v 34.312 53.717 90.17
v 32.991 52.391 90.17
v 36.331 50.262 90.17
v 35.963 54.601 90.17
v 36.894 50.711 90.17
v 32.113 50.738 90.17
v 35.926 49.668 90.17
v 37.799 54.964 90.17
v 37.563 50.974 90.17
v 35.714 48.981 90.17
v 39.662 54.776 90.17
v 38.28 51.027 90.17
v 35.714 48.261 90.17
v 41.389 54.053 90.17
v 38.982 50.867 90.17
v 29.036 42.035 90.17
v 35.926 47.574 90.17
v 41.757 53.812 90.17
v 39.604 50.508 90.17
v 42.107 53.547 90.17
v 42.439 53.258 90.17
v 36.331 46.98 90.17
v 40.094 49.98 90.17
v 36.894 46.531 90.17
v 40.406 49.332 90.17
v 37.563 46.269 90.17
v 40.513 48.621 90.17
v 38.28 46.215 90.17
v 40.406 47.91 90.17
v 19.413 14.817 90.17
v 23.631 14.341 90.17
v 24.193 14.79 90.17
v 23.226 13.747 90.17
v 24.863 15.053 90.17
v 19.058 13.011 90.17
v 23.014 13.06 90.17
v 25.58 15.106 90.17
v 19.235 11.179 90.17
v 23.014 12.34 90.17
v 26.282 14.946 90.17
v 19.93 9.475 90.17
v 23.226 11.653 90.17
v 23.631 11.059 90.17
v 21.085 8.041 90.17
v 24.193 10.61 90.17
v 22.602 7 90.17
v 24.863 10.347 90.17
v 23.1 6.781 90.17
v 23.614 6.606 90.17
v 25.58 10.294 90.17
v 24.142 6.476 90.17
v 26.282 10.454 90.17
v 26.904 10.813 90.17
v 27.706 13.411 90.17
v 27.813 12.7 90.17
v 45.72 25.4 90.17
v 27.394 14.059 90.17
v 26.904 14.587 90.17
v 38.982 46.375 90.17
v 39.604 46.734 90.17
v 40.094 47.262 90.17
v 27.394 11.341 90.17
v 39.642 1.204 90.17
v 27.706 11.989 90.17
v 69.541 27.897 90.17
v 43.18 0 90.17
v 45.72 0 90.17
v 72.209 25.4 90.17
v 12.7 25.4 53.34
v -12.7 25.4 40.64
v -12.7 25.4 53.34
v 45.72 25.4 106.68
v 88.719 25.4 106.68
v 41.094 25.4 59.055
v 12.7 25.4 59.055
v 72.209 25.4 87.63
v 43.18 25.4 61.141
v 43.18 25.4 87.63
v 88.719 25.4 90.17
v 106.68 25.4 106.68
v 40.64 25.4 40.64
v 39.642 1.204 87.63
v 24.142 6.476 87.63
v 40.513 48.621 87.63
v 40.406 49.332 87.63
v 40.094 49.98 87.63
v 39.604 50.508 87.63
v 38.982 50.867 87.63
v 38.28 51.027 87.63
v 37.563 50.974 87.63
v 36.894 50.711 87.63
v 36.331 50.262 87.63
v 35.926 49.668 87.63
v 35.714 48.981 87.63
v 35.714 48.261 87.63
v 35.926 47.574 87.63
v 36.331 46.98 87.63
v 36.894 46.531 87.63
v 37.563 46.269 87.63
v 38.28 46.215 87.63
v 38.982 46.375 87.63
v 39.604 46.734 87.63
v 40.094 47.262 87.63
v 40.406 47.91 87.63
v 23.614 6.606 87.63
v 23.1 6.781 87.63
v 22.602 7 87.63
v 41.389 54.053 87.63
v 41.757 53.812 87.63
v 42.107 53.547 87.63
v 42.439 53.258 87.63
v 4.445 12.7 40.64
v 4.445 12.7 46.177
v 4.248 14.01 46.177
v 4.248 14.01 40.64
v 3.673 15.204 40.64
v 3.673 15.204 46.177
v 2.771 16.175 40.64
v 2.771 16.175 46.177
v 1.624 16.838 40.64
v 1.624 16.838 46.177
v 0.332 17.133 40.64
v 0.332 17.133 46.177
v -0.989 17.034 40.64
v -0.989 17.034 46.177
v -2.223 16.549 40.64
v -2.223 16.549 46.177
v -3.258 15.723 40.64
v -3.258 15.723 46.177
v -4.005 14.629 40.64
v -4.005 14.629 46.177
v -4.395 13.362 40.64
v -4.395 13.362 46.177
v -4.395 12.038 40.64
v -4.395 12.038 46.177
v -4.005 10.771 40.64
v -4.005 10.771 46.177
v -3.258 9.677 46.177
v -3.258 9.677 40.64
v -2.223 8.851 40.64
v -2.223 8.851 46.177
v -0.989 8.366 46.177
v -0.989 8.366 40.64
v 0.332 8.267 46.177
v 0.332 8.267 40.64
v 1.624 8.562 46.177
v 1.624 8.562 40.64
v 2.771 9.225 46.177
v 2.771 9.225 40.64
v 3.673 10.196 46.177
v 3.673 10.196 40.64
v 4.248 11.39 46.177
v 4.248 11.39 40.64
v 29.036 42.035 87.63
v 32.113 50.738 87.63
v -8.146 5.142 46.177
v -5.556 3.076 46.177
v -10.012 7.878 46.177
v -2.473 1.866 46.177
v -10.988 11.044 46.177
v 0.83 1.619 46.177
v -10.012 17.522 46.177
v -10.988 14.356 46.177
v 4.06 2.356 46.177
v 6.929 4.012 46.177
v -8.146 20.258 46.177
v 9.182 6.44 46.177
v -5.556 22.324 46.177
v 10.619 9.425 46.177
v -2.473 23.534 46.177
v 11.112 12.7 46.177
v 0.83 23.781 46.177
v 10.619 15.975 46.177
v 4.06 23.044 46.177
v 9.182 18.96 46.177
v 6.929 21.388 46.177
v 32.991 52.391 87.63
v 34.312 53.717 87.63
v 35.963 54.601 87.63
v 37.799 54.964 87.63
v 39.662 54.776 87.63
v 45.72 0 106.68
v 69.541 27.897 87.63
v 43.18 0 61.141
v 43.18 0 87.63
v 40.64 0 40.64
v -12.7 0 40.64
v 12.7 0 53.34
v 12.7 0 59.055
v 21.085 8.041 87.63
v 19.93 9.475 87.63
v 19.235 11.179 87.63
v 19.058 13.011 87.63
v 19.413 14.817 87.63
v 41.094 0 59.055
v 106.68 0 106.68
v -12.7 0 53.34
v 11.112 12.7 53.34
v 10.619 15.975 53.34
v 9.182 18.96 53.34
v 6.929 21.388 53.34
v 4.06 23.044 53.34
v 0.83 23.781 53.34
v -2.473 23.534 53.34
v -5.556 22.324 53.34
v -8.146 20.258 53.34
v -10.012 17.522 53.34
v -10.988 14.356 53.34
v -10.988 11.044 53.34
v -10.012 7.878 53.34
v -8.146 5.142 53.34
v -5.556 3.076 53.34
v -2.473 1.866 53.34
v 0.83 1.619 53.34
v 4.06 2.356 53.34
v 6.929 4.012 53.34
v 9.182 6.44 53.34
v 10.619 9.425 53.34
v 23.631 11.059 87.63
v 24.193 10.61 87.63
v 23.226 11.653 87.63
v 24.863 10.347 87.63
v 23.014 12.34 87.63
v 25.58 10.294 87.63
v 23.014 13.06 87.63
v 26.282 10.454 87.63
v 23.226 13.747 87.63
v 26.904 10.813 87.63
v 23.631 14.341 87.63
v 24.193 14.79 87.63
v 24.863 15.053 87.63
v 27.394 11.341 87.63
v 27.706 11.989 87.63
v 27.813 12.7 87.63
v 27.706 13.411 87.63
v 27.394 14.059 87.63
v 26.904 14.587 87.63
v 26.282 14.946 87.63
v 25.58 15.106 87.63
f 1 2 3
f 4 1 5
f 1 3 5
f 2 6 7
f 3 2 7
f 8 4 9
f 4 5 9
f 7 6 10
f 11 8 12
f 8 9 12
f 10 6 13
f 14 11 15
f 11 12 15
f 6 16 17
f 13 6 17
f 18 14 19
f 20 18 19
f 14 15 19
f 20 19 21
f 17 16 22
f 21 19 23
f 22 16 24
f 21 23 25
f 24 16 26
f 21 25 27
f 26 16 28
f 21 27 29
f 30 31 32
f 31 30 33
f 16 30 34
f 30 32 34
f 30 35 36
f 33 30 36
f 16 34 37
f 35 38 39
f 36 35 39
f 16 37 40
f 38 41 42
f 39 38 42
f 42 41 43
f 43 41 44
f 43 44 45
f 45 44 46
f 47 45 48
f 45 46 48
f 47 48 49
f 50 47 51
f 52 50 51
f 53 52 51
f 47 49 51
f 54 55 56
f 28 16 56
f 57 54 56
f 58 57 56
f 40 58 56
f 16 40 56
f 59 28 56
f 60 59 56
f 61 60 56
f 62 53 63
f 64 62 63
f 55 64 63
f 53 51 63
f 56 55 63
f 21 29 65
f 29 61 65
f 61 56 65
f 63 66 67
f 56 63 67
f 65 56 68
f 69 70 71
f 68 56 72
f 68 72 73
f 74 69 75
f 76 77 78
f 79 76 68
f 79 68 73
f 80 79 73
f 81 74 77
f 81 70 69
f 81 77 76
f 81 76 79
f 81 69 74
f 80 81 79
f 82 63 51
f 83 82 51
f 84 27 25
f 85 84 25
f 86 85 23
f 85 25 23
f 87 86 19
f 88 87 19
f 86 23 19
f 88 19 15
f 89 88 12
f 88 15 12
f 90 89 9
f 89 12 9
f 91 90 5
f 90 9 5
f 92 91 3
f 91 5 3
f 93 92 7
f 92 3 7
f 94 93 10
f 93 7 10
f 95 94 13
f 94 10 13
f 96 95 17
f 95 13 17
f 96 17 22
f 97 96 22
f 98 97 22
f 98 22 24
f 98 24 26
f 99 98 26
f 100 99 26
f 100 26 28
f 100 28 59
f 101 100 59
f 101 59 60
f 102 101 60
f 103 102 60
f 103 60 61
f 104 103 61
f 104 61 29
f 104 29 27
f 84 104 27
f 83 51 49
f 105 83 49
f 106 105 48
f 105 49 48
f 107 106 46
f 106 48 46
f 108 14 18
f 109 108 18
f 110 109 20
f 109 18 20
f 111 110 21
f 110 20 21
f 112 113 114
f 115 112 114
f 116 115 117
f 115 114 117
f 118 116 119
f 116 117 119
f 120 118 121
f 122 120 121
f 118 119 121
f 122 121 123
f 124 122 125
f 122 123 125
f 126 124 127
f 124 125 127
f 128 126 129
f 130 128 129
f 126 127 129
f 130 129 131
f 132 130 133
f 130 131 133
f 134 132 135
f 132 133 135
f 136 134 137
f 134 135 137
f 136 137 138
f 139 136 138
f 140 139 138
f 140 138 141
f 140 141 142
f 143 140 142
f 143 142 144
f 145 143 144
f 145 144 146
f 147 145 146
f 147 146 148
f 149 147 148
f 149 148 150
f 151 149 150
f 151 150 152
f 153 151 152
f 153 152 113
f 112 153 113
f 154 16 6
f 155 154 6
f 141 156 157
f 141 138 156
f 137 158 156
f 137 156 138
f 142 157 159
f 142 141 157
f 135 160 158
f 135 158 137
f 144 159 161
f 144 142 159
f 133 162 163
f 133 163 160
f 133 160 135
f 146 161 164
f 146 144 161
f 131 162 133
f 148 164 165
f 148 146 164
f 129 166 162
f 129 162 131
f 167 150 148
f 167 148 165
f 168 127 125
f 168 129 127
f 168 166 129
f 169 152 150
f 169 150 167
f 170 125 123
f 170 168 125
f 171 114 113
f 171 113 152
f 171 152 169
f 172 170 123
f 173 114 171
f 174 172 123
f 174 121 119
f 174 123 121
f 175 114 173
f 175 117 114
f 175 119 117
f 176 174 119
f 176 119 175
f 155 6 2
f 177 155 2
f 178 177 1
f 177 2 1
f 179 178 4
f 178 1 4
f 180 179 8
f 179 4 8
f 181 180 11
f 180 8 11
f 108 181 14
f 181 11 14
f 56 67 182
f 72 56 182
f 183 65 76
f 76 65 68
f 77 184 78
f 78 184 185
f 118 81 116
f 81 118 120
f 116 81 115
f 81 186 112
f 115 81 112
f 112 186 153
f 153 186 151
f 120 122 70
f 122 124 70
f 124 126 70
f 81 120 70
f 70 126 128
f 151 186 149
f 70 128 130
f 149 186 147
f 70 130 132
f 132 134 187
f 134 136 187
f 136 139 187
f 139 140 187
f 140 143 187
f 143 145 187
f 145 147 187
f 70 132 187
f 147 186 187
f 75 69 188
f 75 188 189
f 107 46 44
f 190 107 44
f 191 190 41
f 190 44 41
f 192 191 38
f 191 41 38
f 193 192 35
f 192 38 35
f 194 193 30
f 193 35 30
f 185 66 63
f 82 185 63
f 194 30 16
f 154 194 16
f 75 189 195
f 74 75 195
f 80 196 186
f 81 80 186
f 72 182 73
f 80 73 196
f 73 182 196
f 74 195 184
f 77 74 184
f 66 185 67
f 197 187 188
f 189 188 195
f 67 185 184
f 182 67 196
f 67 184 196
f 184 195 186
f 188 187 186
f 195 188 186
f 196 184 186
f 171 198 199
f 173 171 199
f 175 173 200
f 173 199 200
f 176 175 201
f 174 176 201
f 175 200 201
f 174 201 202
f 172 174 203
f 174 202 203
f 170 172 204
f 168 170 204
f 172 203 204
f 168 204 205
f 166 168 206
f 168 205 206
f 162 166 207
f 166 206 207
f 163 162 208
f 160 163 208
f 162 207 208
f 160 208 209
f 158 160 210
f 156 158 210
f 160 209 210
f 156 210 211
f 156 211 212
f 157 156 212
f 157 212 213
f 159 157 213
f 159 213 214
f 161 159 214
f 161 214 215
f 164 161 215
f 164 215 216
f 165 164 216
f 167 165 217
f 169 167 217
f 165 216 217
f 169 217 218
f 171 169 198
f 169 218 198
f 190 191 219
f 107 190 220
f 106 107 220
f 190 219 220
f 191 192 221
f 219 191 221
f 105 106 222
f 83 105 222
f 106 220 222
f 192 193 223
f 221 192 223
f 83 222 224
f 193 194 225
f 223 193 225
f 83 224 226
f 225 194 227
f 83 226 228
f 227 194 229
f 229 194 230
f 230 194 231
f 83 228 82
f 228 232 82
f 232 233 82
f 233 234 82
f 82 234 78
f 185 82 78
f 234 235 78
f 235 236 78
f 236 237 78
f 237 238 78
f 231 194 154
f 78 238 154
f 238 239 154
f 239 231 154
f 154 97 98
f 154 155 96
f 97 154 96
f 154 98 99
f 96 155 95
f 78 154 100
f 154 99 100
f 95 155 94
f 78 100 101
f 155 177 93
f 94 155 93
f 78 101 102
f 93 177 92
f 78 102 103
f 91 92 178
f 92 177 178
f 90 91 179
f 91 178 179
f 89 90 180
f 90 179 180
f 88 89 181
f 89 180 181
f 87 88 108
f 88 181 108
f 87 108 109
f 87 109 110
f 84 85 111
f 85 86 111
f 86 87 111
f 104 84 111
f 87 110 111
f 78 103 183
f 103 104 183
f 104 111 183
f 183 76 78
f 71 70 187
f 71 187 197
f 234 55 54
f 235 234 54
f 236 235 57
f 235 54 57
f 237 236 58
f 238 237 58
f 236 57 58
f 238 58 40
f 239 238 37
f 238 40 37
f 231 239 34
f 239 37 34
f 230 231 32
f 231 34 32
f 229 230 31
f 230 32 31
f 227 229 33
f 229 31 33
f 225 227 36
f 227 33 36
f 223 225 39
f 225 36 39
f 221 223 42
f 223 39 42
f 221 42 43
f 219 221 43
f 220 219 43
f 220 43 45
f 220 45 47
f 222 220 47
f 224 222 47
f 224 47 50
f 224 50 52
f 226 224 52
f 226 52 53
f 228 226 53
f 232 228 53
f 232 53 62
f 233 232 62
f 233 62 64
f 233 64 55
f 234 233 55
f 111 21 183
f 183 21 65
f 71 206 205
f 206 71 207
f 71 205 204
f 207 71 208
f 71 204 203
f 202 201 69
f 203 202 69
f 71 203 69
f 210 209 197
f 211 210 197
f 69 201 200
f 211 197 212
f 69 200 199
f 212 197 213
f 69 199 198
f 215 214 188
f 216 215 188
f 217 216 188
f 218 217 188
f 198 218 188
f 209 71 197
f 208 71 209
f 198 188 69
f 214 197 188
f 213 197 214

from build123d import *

# Parameters (mm, degrees)
BOSS_EXTRUDE1_DEPTH = 25.4
SKETCH2_R           = 11.1125
CUT_EXTRUDE1_DEPTH  = 7.1628
CUT_EXTRUDE2_REACH  = 123.946
SKETCH2_3_R         = 4.445
BOSS_EXTRUDE2_DEPTH = 68.58
CUT_EXTRUDE3_REACH  = 138.151
SKETCH4_R           = 2.413
CUT_EXTRUDE4_REACH  = 138.151
CUT_EXTRUDE5_START  = 16.51
CUT_EXTRUDE5_DEPTH  = 16.51
CUT_EXTRUDE7_REACH  = 131.829
CUT_EXTRUDE8_REACH  = 155.739
CUT_EXTRUDE10_REACH = 131.829
BOSS_EXTRUDE3_DEPTH = 2.54


with BuildPart() as part:
    # Sketch1 → Boss-Extrude1 (new body)
    with BuildSketch(Plane(origin=(0, 0, 0), x_dir=(1, 0, 0), z_dir=(0, 1, 0))):
        Polygon((35.379487758, -53.34), (22.679487758, -40.64), (-12.7, -40.64), (-12.7, -53.34), (12.7, -53.34), align=None)
        Polygon((90.17, -90.17), (40.64, -40.64), (22.679487758, -40.64), (35.379487758, -53.34), (41.094487758, -59.055), (43.18, -61.140512242), (72.209487758, -90.17), align=None)
        Polygon((41.094487758, -59.055), (35.379487758, -53.34), (12.7, -53.34), (12.7, -59.055), align=None)
        Polygon((45.72, -90.17), (72.209487758, -90.17), (43.18, -61.140512242), (43.18, -87.63), (16.51, -87.63), (16.51, -90.17), align=None)
        Polygon((88.719487758, -106.68), (72.209487758, -90.17), (45.72, -90.17), (45.72, -106.68), align=None)
        Polygon((106.68, -106.68), (90.17, -90.17), (72.209487758, -90.17), (88.719487758, -106.68), align=None)
    extrude(amount=BOSS_EXTRUDE1_DEPTH)

    # Sketch2 → Cut-Extrude1 (cut)
    with BuildSketch(Plane.XY.offset(53.34)):
        with Locations((0, 12.7)):
            Circle(SKETCH2_R)
    extrude(amount=-CUT_EXTRUDE1_DEPTH, mode=Mode.SUBTRACT)

    # Sketch2<3> → Cut-Extrude2 (cut, up to next)
    with BuildSketch(Plane.XY.offset(53.34), mode=Mode.PRIVATE) as cut_extrude2_sk1:
        with Locations((0, 12.7)):
            Circle(SKETCH2_3_R)
    cut_extrude2_tool1 = extrude(cut_extrude2_sk1.sketch, amount=-CUT_EXTRUDE2_REACH, mode=Mode.PRIVATE) & part.part
    add(cut_extrude2_tool1.solids().sort_by_distance((0, 12.7, 53.34))[0], mode=Mode.SUBTRACT)

    # Sketch1<3> → Boss-Extrude2 (add)
    with BuildSketch(Plane(origin=(0, 0, 0), x_dir=(1, 0, 0), z_dir=(0, 1, 0))):
        Polygon((88.719487758, -106.68), (72.209487758, -90.17), (45.72, -90.17), (45.72, -106.68), align=None)
        Polygon((45.72, -90.17), (72.209487758, -90.17), (43.18, -61.140512242), (43.18, -87.63), (16.51, -87.63), (16.51, -90.17), align=None)
    extrude(amount=BOSS_EXTRUDE2_DEPTH)

    # Sketch4 → Cut-Extrude3 (cut, up to next)
    with BuildSketch(Plane.XY.offset(90.17), mode=Mode.PRIVATE) as cut_extrude3_sk1:
        with Locations((38.1, 48.621024484)):
            Circle(SKETCH4_R)
    cut_extrude3_tool1 = extrude(cut_extrude3_sk1.sketch, amount=-CUT_EXTRUDE3_REACH, mode=Mode.PRIVATE) & part.part
    # Sketch4 → Cut-Extrude3 (cut, up to next)
    with BuildSketch(Plane.XY.offset(90.17), mode=Mode.PRIVATE) as cut_extrude3_sk2:
        with Locations((25.4, 12.7)):
            Circle(SKETCH4_R)
    cut_extrude3_tool2 = extrude(cut_extrude3_sk2.sketch, amount=-CUT_EXTRUDE3_REACH, mode=Mode.PRIVATE) & part.part
    add(cut_extrude3_tool1.solids().sort_by_distance((38.1, 48.621024, 90.17))[0], mode=Mode.SUBTRACT)
    add(cut_extrude3_tool2.solids().sort_by_distance((25.4, 12.7, 90.17))[0], mode=Mode.SUBTRACT)

    # Sketch4<4> → Cut-Extrude4 (cut, up to next)
    with BuildSketch(Plane.XY.offset(90.17), mode=Mode.PRIVATE) as cut_extrude4_sk1:
        with BuildLine():
            ThreePointArc((16.51, 50.529162362), (23.165769401, 46.860982905), (29.036193408, 42.034708067))
            Line((29.036193408, 42.034708067), (32.113162586, 50.737691151))
            ThreePointArc((32.113162586, 50.737691151), (35.962630111, 54.600501883), (41.388506693, 54.053171733))
            Line((41.388506693, 54.053171733), (88.719487758, 25.4))
            Line((88.719487758, 25.4), (88.719487758, 68.58))
            Line((88.719487758, 68.58), (16.51, 68.58))
            Line((16.51, 68.58), (16.51, 50.529162362))
        make_face()
    cut_extrude4_tool1 = extrude(cut_extrude4_sk1.sketch, amount=-CUT_EXTRUDE4_REACH, mode=Mode.PRIVATE) & part.part
    # Sketch4<4> → Cut-Extrude4 (cut, up to next)
    with BuildSketch(Plane.XY.offset(90.17), mode=Mode.PRIVATE) as cut_extrude4_sk2:
        with BuildLine():
            ThreePointArc((24.141722061, 6.475914796), (23.355096734, 6.688272242), (22.602138971, 6.999607587))
            ThreePointArc((22.602138971, 6.999607587), (19.520430726, 10.301424349), (19.413162586, 14.816666667))
            Line((19.413162586, 14.816666667), (29.036193408, 42.034708067))
            ThreePointArc((29.036193408, 42.034708067), (23.165769401, 46.860982905), (16.51, 50.529162362))
            Line((16.51, 50.529162362), (16.51, 0))
            Line((16.51, 0), (39.272581084, 0))
            ThreePointArc((39.272581084, 0), (39.461690116, 0.600386859), (39.64162121, 1.203587826))
            Line((39.64162121, 1.203587826), (24.141722061, 6.475914796))
        make_face()
    cut_extrude4_tool2 = extrude(cut_extrude4_sk2.sketch, amount=-CUT_EXTRUDE4_REACH, mode=Mode.PRIVATE) & part.part
    add(cut_extrude4_tool1.solids().sort_by_distance((58.41037, 54.420035, 90.17))[0], mode=Mode.SUBTRACT)
    add(cut_extrude4_tool2.solids().sort_by_distance((21.980861, 24.151697, 90.17))[0], mode=Mode.SUBTRACT)

    # Sketch4<7> → Cut-Extrude5 (cut)
    with BuildSketch(Plane.XY.offset(90.17).offset(CUT_EXTRUDE5_START)):
        with BuildLine():
            ThreePointArc((16.51, 50.529162362), (23.165769401, 46.860982905), (29.036193408, 42.034708067))
            Line((29.036193408, 42.034708067), (32.113162586, 50.737691151))
            ThreePointArc((32.113162586, 50.737691151), (35.962630111, 54.600501883), (41.388506693, 54.053171733))
            Line((41.388506693, 54.053171733), (88.719487758, 25.4))
            Line((88.719487758, 25.4), (88.719487758, 68.58))
            Line((88.719487758, 68.58), (16.51, 68.58))
            Line((16.51, 68.58), (16.51, 50.529162362))
        make_face()
        with BuildLine():
            ThreePointArc((24.141722061, 6.475914796), (23.355096734, 6.688272242), (22.602138971, 6.999607587))
            ThreePointArc((22.602138971, 6.999607587), (19.520430726, 10.301424349), (19.413162586, 14.816666667))
            Line((19.413162586, 14.816666667), (29.036193408, 42.034708067))
            ThreePointArc((29.036193408, 42.034708067), (23.165769401, 46.860982905), (16.51, 50.529162362))
            Line((16.51, 50.529162362), (16.51, 0))
            Line((16.51, 0), (39.272581084, 0))
            ThreePointArc((39.272581084, 0), (39.461690116, 0.600386859), (39.64162121, 1.203587826))
            Line((39.64162121, 1.203587826), (24.141722061, 6.475914796))
        make_face()
        with BuildLine():
            Line((43.18, 0), (39.64162121, 1.203587826))
            ThreePointArc((39.64162121, 1.203587826), (39.461690116, 0.600386859), (39.272581084, 0))
            Line((39.272581084, 0), (43.18, 0))
        make_face()
    extrude(amount=-CUT_EXTRUDE5_DEPTH, mode=Mode.SUBTRACT)

    # Sketch4<10> → Cut-Extrude7 (cut, up to next)
    with BuildSketch(Plane.XY.offset(90.17), mode=Mode.PRIVATE) as cut_extrude7_sk1:
        with BuildLine():
            Line((43.18, 0), (39.64162121, 1.203587826))
            ThreePointArc((39.64162121, 1.203587826), (39.461690116, 0.600386859), (39.272581084, 0))
            Line((39.272581084, 0), (43.18, 0))
        make_face()
    cut_extrude7_tool1 = extrude(cut_extrude7_sk1.sketch, amount=-CUT_EXTRUDE7_REACH, mode=Mode.PRIVATE) & part.part
    add(cut_extrude7_tool1.solids().sort_by_distance((40.700194, 0.400853, 90.17))[0], mode=Mode.SUBTRACT)

    # Sketch7 → Cut-Extrude8 (cut, up to next)
    with BuildSketch(Plane(origin=(0, 25.4, 0), x_dir=(1, 0, 0), z_dir=(0, 1, 0)), mode=Mode.PRIVATE) as cut_extrude8_sk1:
        Polygon((43.18, -61.140512242), (43.18, -87.63), (69.669487758, -87.63), align=None)
    cut_extrude8_tool1 = extrude(cut_extrude8_sk1.sketch, amount=CUT_EXTRUDE8_REACH, mode=Mode.PRIVATE) & part.part
    # Sketch7 → Cut-Extrude8 (cut, up to next)
    with BuildSketch(Plane(origin=(0, 25.4, 0), x_dir=(1, 0, 0), z_dir=(0, 1, 0)), mode=Mode.PRIVATE) as cut_extrude8_sk2:
        Polygon((45.72, -90.17), (72.209487758, -90.17), (88.719487758, -106.68), (45.72, -106.68), align=None)
    cut_extrude8_tool2 = extrude(cut_extrude8_sk2.sketch, amount=CUT_EXTRUDE8_REACH, mode=Mode.PRIVATE) & part.part
    add(cut_extrude8_tool1.solids().sort_by_distance((52.009829, 25.4, 78.800171))[0], mode=Mode.SUBTRACT)
    add(cut_extrude8_tool2.solids().sort_by_distance((63.41913, 25.4, 99.078773))[0], mode=Mode.SUBTRACT)

    # Sketch8 → Cut-Extrude10 (cut, up to next)
    with BuildSketch(Plane.XY.offset(90.17), mode=Mode.PRIVATE) as cut_extrude10_sk1:
        with BuildLine():
            Line((69.540863311, 27.897131539), (72.209487758, 25.4))
            Line((72.209487758, 25.4), (72.209487758, 35.394803713))
            Line((72.209487758, 35.394803713), (41.388506693, 54.053171733))
            ThreePointArc((41.388506693, 54.053171733), (41.934277279, 53.682725557), (42.438674479, 53.257661602))
            Line((42.438674479, 53.257661602), (69.540863311, 27.897131539))
        make_face()
    cut_extrude10_tool1 = extrude(cut_extrude10_sk1.sketch, amount=-CUT_EXTRUDE10_REACH, mode=Mode.PRIVATE) & part.part
    add(cut_extrude10_tool1.solids().sort_by_distance((62.122661, 38.169884, 90.17))[0], mode=Mode.SUBTRACT)

    # Sketch8<3> → Boss-Extrude3 (add)
    with BuildSketch(Plane.XY.offset(90.17)):
        Polygon((69.540863311, 25.4), (72.209487758, 25.4), (69.540863311, 27.897131539), align=None)
    extrude(amount=-BOSS_EXTRUDE3_DEPTH)


solid = part.part
